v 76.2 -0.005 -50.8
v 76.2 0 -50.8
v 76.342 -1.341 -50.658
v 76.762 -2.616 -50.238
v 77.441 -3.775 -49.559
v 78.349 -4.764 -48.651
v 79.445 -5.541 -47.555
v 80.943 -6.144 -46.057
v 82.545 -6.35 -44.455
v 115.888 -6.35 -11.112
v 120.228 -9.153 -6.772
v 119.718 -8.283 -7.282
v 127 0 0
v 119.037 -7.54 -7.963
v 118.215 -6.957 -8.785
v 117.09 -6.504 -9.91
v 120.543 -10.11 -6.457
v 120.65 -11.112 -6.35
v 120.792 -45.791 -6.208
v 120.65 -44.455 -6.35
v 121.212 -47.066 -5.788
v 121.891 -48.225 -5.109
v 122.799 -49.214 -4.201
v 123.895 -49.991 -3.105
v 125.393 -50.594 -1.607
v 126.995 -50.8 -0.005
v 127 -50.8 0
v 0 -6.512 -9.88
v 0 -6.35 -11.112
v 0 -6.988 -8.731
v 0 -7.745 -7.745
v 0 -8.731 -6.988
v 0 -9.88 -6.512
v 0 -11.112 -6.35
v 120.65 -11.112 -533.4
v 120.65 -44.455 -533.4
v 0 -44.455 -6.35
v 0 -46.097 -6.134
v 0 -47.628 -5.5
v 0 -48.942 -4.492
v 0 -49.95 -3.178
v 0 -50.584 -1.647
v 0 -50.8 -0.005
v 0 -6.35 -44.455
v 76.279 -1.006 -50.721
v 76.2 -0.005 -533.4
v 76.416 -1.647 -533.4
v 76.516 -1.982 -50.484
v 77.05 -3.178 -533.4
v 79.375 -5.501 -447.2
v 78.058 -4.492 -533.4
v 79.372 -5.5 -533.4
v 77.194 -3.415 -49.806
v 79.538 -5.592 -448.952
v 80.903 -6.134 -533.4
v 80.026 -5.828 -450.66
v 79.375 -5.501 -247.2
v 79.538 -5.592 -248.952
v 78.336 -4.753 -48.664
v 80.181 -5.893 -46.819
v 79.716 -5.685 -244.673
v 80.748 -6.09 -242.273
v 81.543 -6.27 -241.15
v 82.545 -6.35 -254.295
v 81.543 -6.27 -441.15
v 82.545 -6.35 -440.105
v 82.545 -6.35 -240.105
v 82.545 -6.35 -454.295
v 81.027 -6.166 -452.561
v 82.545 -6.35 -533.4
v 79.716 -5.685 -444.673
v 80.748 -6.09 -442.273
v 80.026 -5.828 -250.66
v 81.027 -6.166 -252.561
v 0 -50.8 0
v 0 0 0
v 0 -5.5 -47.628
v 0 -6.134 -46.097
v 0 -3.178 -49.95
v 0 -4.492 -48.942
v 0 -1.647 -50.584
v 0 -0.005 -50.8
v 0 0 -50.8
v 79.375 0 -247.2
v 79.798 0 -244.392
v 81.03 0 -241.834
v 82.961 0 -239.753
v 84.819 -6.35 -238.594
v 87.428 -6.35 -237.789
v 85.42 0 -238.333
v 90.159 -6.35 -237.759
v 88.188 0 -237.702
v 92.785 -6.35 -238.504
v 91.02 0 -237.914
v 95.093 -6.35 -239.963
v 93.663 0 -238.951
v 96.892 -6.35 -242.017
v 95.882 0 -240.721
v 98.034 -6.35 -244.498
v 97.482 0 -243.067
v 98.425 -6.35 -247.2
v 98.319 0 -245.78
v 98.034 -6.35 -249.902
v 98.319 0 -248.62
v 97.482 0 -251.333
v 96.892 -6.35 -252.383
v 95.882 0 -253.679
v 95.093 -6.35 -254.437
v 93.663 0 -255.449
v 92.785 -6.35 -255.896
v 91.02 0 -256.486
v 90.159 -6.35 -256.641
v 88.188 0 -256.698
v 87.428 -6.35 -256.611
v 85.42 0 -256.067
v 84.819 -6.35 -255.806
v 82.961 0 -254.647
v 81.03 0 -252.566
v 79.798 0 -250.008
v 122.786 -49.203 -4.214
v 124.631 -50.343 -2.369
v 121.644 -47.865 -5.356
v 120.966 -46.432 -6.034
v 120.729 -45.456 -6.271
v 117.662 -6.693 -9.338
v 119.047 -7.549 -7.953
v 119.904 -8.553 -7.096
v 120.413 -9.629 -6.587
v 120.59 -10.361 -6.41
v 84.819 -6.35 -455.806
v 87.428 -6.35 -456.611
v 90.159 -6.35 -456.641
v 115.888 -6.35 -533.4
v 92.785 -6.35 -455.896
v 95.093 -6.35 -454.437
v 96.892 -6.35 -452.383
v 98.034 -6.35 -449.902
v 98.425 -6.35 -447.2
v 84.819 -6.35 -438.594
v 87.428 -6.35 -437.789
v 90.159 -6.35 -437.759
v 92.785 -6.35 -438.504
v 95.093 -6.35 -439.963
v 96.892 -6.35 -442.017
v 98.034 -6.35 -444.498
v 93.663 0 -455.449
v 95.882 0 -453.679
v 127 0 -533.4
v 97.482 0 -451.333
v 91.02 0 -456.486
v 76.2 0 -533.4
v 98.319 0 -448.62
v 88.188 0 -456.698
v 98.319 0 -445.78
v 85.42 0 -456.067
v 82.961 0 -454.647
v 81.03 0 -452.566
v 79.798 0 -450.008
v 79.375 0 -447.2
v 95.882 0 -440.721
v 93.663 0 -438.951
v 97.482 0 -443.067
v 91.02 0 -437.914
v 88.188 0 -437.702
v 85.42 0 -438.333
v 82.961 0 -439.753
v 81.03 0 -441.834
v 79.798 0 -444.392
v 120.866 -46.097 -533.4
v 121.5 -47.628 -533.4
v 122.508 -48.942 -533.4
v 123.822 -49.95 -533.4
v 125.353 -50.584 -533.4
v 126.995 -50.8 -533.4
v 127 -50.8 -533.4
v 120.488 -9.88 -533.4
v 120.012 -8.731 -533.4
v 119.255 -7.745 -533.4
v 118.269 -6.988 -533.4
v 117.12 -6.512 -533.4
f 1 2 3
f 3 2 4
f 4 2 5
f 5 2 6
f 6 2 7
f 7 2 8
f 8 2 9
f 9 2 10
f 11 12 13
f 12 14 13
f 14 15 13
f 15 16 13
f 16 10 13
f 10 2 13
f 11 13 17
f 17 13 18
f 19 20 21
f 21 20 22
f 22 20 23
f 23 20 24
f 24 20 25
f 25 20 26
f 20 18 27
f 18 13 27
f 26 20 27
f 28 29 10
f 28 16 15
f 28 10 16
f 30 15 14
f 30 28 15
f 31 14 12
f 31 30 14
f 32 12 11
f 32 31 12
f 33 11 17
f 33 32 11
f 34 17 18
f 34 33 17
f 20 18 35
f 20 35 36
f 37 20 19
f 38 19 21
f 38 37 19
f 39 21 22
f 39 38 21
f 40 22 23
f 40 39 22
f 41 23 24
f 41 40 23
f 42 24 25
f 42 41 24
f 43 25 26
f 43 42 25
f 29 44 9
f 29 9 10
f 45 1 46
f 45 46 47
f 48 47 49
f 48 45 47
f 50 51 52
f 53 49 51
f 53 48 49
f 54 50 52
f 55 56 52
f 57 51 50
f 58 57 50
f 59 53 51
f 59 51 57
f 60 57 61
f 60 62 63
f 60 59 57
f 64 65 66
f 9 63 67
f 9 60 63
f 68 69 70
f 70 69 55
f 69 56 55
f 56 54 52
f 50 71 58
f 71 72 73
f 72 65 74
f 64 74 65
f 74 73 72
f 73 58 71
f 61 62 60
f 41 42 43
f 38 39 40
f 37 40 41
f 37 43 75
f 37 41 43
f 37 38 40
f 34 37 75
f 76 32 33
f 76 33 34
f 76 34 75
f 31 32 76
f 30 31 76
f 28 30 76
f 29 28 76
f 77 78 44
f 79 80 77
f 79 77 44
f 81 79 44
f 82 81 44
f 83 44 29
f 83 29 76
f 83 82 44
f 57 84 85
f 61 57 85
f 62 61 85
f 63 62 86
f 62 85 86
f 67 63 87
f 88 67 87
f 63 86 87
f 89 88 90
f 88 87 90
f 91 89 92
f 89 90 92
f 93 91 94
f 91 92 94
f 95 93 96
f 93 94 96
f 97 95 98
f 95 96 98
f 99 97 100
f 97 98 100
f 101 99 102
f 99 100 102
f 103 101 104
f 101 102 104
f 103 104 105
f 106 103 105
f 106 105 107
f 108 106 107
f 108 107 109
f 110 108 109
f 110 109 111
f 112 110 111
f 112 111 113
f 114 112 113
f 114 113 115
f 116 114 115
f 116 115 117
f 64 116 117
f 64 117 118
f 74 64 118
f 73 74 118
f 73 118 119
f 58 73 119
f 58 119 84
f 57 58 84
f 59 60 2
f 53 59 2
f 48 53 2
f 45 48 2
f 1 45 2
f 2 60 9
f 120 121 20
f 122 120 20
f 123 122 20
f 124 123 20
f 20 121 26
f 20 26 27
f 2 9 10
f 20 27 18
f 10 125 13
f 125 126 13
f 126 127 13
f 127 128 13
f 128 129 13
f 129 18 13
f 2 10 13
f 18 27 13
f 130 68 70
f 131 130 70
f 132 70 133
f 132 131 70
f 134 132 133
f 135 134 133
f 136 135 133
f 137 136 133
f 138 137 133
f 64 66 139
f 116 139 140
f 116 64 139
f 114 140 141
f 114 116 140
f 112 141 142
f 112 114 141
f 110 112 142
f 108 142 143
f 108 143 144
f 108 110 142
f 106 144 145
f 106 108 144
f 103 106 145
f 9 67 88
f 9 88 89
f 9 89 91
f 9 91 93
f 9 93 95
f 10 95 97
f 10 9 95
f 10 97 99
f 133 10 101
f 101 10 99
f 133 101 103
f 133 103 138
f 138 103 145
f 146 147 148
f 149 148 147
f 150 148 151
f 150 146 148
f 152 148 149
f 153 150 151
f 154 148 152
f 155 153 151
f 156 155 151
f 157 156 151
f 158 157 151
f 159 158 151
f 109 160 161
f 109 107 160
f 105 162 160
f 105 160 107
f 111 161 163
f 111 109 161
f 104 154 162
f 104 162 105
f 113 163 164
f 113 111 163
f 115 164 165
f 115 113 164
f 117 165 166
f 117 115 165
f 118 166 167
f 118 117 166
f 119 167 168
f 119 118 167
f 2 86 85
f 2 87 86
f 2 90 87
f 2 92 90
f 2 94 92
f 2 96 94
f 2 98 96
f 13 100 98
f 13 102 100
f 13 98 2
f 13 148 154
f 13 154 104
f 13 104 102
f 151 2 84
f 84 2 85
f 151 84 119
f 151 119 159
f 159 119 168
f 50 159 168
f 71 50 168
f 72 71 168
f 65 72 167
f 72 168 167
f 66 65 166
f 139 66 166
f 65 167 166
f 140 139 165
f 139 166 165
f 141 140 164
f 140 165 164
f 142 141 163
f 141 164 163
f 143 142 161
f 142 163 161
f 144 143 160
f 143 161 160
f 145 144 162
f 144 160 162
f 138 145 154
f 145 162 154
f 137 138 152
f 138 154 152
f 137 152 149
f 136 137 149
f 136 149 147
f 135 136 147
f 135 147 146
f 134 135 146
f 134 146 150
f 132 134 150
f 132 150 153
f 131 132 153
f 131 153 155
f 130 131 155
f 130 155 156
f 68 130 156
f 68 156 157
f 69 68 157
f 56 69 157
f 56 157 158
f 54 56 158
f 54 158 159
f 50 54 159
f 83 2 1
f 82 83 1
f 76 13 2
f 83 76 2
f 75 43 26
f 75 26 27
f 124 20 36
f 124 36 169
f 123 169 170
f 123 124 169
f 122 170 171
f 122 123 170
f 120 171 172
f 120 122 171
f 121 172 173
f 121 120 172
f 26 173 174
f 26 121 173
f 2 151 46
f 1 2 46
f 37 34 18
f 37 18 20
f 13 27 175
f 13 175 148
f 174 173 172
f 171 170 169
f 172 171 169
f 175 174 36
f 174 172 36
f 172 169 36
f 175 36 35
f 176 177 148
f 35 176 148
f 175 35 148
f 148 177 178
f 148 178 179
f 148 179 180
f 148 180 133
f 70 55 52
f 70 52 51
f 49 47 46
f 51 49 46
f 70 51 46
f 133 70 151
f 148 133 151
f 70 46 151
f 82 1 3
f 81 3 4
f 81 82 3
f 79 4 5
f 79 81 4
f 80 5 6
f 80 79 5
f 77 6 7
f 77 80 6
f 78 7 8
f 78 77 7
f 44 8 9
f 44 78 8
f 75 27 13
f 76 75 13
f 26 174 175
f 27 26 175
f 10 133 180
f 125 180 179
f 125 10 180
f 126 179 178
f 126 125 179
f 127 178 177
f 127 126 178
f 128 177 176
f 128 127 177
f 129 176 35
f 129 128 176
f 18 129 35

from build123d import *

# Parameters (mm, degrees)
HIERRO_ANGULAR_2_X_2_X_0_125_1_DEPTH   = 199.842048969
HIERRO_ANGULAR_2_X_2_X_0_125_1_2_DEPTH = 606.242048969
CROQUIS6_R                             = 9.525
CORTAR_EXTRUIR1_DEPTH                  = 551.658878072


with BuildPart() as part:
    # Sketch1 → Hierro angular 2 X 2 X 0.125(1) (new body)
    with BuildSketch(Plane(origin=(0, 0, 0), x_dir=(0, -1, 0), z_dir=(1, 0, 0))):
        with BuildLine():
            Line((0, 0), (0, 50.8))
            Line((0, 50.8), (0.00508, 50.8))
            ThreePointArc((0.00508, 50.8), (4.491615958, 48.941615958), (6.35, 44.45508))
            Line((6.35, 44.45508), (6.35, 11.1125))
            ThreePointArc((6.35, 11.1125), (7.744903955, 7.744903955), (11.1125, 6.35))
            Line((11.1125, 6.35), (44.45508, 6.35))
            ThreePointArc((44.45508, 6.35), (48.941615958, 4.491615958), (50.8, 0.00508))
            Line((50.8, 0.00508), (50.8, 0))
            Line((50.8, 0), (0, 0))
        make_face()
    extrude(amount=HIERRO_ANGULAR_2_X_2_X_0_125_1_DEPTH)

    # Hierro angular 2 X 2 X 0.125(1) mitre 1
    split(bisect_by=Plane(origin=(127, 0, 0), x_dir=(0, -1, 0), z_dir=(-0.707106781, 0, 0.707106781)), keep=Keep.TOP)


with BuildPart() as body_2:
    # Sketch1 on segment 2 (carried to segment 2) → Hierro angular 2 X 2 X 0.125_1 2 (new body)
    with BuildSketch(Plane(origin=(127, 0, 72.842048969), x_dir=(0, -1, 0), z_dir=(0, 0, -1))):
        with BuildLine():
            Line((0, 0), (0, 50.8))
            Line((0, 50.8), (0.00508, 50.8))
            ThreePointArc((0.00508, 50.8), (4.491615958, 48.941615958), (6.35, 44.45508))
            Line((6.35, 44.45508), (6.35, 11.1125))
            ThreePointArc((6.35, 11.1125), (7.744903955, 7.744903955), (11.1125, 6.35))
            Line((11.1125, 6.35), (44.45508, 6.35))
            ThreePointArc((44.45508, 6.35), (48.941615958, 4.491615958), (50.8, 0.00508))
            Line((50.8, 0.00508), (50.8, 0))
            Line((50.8, 0), (0, 0))
        make_face()
    extrude(amount=HIERRO_ANGULAR_2_X_2_X_0_125_1_2_DEPTH)

    # Hierro angular 2 X 2 X 0.125_1 2 mitre 1
    split(bisect_by=Plane(origin=(127, 0, 0), x_dir=(0, 1, 0), z_dir=(0.707106781, 0, -0.707106781)), keep=Keep.TOP)

    # Croquis6 → Cortar-Extruir1 (cut, through all)
    with BuildSketch(Plane(origin=(0, 0, 0), x_dir=(1, 0, 0), z_dir=(0, 1, 0))):
        with Locations(Location((88.9, 447.2, 0), (0, 0, 180))):
            Circle(CROQUIS6_R)
        with Locations(Location((88.9, 247.2, 0), (0, 0, 180))):
            Circle(CROQUIS6_R)
    extrude(amount=-CORTAR_EXTRUIR1_DEPTH, mode=Mode.SUBTRACT)


solid = Compound([part.part, body_2.part])
